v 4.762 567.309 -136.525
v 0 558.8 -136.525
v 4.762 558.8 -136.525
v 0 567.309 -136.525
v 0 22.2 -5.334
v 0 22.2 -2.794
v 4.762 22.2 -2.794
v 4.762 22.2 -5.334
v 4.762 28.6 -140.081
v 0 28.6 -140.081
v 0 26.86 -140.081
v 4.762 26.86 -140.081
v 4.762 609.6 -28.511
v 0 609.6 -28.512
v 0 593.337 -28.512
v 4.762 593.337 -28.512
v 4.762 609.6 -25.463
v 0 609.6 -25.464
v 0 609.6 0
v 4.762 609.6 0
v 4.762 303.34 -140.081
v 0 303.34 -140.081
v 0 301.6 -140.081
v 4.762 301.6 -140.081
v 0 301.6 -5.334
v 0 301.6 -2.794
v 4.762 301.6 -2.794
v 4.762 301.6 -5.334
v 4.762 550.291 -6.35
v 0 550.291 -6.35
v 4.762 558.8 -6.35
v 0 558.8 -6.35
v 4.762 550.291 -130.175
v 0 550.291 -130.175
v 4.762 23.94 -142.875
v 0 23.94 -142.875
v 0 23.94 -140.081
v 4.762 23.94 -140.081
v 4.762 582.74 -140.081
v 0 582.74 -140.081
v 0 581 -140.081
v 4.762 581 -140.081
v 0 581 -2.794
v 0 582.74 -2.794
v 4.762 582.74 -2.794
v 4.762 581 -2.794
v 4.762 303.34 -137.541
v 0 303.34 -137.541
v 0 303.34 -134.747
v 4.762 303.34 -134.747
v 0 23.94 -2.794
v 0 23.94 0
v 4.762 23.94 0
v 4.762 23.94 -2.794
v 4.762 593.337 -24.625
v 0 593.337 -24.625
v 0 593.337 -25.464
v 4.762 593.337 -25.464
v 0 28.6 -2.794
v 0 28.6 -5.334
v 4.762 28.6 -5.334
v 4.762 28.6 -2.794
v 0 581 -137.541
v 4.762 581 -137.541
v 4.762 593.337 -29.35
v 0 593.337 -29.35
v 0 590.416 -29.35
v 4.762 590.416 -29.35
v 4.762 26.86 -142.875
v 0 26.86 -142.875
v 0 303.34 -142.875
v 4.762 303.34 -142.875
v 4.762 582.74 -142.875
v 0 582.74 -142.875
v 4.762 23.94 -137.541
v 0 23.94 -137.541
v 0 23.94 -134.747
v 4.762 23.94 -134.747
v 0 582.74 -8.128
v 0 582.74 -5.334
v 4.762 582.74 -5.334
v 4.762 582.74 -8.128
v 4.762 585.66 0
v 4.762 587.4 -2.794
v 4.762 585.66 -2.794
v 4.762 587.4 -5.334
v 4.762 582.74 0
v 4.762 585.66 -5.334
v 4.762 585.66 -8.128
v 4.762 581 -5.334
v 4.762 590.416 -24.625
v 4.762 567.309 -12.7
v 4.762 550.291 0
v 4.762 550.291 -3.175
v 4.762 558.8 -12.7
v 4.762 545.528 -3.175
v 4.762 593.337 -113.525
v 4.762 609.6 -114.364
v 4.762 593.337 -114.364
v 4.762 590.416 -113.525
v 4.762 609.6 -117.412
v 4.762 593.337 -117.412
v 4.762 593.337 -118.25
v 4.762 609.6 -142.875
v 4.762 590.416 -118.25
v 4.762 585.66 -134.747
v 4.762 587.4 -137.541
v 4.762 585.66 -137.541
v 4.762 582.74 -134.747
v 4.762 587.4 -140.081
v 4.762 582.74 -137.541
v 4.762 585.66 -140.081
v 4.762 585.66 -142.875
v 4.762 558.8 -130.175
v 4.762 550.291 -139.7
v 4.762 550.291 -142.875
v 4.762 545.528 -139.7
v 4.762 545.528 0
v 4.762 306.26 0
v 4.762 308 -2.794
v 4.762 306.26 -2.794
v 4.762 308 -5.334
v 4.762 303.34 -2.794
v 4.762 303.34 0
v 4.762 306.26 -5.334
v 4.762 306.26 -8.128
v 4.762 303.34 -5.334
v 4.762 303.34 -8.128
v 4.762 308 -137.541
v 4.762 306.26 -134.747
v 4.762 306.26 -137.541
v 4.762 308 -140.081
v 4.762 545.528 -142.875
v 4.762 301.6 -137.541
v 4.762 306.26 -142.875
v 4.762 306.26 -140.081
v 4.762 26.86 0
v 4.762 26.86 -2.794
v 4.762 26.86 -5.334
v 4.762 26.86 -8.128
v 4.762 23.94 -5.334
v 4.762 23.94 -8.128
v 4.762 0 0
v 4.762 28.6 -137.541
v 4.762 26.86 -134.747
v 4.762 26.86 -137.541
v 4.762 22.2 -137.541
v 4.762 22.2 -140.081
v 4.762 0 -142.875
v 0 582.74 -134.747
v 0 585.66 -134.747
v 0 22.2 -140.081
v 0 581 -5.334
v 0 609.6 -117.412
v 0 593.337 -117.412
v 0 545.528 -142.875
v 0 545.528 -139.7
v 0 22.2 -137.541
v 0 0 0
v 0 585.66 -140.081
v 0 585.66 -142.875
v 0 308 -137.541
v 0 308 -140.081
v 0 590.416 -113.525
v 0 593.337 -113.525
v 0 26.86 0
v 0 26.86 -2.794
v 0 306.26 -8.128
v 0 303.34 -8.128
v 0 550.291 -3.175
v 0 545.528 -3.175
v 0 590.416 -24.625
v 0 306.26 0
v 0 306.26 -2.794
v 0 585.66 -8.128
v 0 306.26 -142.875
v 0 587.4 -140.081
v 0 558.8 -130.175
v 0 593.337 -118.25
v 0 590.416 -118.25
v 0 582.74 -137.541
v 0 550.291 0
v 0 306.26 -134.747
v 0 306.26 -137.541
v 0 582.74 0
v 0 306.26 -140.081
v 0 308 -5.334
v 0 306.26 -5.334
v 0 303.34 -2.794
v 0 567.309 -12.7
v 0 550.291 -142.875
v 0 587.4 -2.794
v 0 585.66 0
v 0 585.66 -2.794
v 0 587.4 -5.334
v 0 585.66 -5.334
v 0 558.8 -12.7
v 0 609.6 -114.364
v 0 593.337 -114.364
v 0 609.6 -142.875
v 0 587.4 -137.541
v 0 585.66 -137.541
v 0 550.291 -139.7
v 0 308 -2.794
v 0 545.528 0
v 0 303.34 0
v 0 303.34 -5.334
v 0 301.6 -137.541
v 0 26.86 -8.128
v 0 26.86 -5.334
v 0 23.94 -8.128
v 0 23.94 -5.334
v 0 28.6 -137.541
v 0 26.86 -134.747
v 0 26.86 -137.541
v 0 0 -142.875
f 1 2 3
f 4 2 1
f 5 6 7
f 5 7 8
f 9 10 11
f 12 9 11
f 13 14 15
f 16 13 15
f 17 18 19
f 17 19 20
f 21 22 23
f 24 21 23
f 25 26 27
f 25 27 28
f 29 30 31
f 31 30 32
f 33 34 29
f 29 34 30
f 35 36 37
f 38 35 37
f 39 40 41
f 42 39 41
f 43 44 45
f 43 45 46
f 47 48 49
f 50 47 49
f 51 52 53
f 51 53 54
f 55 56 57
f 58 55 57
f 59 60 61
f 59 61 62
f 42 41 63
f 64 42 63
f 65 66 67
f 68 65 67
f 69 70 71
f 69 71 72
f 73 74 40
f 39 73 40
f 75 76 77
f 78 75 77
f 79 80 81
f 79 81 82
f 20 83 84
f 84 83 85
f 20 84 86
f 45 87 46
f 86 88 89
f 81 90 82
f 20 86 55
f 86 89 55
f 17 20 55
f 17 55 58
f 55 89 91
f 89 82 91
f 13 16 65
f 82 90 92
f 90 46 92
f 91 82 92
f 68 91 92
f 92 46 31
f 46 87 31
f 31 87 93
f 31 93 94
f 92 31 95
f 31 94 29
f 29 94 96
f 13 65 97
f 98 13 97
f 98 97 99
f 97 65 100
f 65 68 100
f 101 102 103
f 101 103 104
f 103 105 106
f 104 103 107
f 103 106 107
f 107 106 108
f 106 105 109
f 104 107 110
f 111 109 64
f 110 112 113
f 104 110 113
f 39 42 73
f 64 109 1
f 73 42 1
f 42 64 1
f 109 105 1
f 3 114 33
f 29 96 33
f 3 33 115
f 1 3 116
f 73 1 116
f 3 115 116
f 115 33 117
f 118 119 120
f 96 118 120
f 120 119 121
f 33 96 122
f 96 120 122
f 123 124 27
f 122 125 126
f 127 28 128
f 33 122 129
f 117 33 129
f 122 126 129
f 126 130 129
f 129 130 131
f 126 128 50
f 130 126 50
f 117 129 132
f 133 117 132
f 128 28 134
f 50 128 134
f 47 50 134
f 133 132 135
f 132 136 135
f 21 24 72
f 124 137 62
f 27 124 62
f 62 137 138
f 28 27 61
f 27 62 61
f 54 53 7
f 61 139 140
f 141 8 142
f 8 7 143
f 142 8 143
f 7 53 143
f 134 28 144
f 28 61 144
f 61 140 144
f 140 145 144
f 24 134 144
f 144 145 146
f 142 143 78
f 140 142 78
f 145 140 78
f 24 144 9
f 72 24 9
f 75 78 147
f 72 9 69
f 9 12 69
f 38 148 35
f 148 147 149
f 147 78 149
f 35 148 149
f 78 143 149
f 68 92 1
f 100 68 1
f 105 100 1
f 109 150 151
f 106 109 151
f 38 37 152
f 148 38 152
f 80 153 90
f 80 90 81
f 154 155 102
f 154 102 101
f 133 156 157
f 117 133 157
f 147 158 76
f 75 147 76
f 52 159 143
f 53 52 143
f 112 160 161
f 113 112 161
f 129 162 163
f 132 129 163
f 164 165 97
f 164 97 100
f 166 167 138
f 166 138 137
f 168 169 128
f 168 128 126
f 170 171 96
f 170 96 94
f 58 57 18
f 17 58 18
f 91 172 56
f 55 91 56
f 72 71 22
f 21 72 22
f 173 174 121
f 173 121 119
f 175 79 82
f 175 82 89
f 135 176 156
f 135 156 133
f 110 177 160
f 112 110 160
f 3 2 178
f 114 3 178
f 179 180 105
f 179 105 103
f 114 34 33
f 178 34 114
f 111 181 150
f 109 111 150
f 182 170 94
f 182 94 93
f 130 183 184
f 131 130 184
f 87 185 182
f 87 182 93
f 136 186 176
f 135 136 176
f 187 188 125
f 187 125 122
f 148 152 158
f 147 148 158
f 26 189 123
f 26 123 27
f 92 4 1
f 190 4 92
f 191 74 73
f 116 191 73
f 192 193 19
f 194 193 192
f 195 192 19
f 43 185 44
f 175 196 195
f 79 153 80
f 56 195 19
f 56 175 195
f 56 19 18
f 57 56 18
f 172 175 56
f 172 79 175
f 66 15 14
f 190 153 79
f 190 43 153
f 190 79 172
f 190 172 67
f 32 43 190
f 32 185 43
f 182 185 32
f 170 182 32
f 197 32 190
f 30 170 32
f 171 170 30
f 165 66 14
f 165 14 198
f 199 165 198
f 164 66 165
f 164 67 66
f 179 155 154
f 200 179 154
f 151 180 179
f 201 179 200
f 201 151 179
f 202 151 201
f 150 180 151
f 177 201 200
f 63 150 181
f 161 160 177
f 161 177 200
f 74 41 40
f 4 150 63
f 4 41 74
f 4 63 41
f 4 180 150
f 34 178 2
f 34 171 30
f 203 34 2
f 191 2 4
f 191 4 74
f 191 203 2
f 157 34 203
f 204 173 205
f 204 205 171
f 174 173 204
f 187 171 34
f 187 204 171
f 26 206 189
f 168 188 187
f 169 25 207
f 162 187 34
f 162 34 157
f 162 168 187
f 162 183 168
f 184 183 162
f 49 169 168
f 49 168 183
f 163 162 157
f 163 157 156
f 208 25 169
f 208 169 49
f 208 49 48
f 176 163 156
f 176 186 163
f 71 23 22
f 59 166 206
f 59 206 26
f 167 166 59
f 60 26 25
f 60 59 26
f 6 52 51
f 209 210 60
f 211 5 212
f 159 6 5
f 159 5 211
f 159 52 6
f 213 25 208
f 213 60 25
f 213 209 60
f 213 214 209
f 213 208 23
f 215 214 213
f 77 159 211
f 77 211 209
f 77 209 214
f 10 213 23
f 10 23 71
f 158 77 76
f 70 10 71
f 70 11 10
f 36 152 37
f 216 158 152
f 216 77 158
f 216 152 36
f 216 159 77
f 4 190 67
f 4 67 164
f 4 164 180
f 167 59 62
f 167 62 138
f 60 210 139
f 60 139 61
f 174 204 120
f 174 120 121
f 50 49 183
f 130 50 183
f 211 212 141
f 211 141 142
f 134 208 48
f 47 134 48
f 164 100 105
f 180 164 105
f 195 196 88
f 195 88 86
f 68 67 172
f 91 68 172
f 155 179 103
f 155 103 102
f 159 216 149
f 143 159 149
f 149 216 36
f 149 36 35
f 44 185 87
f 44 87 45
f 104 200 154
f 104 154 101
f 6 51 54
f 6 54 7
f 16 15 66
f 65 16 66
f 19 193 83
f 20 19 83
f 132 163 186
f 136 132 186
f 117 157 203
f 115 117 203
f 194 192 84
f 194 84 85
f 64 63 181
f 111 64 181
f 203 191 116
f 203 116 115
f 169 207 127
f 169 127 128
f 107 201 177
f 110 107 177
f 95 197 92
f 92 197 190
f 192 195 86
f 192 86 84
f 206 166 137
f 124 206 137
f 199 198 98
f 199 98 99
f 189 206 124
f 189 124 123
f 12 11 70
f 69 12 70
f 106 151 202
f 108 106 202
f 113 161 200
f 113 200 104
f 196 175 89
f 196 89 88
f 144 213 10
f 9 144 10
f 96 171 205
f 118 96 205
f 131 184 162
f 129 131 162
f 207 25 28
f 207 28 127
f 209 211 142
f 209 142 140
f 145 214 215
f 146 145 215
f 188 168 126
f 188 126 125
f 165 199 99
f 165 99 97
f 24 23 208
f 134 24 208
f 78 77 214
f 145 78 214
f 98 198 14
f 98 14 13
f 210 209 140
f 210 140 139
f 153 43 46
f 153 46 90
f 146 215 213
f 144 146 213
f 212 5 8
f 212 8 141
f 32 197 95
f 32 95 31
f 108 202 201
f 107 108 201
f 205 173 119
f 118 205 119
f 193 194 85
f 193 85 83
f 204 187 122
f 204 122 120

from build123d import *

# Parameters (mm, degrees)
SKETCH1_W           = 4.7625
SKETCH1_H           = 142.875
BOSS_EXTRUDE1_DEPTH = 609.6
SKETCH12_W          = 123.825
SKETCH12_H          = 8.509
CUT_EXTRUDE7_DEPTH  = 627.13745059
SKETCH13_W          = 123.825
SKETCH13_H          = 8.509
CUT_EXTRUDE8_DEPTH  = 627.13745059
SKETCH15_W          = 3.175
SKETCH15_H          = 4.7625
CUT_EXTRUDE10_DEPTH = 627.13745059
CUT_EXTRUDE11_DEPTH = 627.13745059
CUT_EXTRUDE12_DEPTH = 627.13745059


with BuildPart() as part:
    # Sketch1 → Boss-Extrude1 (new body)
    with BuildSketch(Plane(origin=(0, 0, 0), x_dir=(1, 0, 0), z_dir=(0, 1, 0))):
        with Locations((2.38125, 71.4375)):
            Rectangle(SKETCH1_W, SKETCH1_H)
    extrude(amount=BOSS_EXTRUDE1_DEPTH)

    # Sketch12 → Cut-Extrude7 (cut, through all)
    with BuildSketch(Plane.ZY):
        with Locations((-68.2625, 554.5455)):
            Rectangle(SKETCH12_W, SKETCH12_H)
    extrude(amount=-CUT_EXTRUDE7_DEPTH, mode=Mode.SUBTRACT)

    # Sketch13 → Cut-Extrude8 (cut, through all)
    with BuildSketch(Plane.ZY):
        with Locations((-74.6125, 563.0545)):
            Rectangle(SKETCH13_W, SKETCH13_H)
    extrude(amount=-CUT_EXTRUDE8_DEPTH, mode=Mode.SUBTRACT)

    # Sketch15 → Cut-Extrude10 (cut, through all)
    with BuildSketch(Plane.ZY):
        with Locations((-1.5875, 547.90975)):
            Rectangle(SKETCH15_W, SKETCH15_H)
        with Locations((-141.2875, 547.90975)):
            Rectangle(SKETCH15_W, SKETCH15_H)
    extrude(amount=-CUT_EXTRUDE10_DEPTH, mode=Mode.SUBTRACT)

    # Sketch16 → Cut-Extrude11 (cut, through all)
    with BuildSketch(Plane.ZY):
        Polygon((-2.794, 23.9395), (-2.794, 22.1996), (-5.334, 22.1996), (-5.334, 23.9395), (-8.128, 23.9395), (-8.128, 26.8605), (-5.334, 26.8605), (-5.334, 28.6004), (-2.794, 28.6004), (-2.794, 26.8605), (0, 26.8605), (0, 23.9395), align=None)
        Polygon((-134.747, 26.8605), (-137.541, 26.8605), (-137.541, 28.6004), (-140.081, 28.6004), (-140.081, 26.8605), (-142.875, 26.8605), (-142.875, 23.9395), (-140.081, 23.9395), (-140.081, 22.1996), (-137.541, 22.1996), (-137.541, 23.9395), (-134.747, 23.9395), align=None)
        Polygon((-134.747, 306.2605), (-137.541, 306.2605), (-137.541, 308.0004), (-140.081, 308.0004), (-140.081, 306.2605), (-142.875, 306.2605), (-142.875, 303.3395), (-140.081, 303.3395), (-140.081, 301.5996), (-137.541, 301.5996), (-137.541, 303.3395), (-134.747, 303.3395), align=None)
        Polygon((-2.794, 303.3395), (-2.794, 301.5996), (-5.334, 301.5996), (-5.334, 303.3395), (-8.128, 303.3395), (-8.128, 306.2605), (-5.334, 306.2605), (-5.334, 308.0004), (-2.794, 308.0004), (-2.794, 306.2605), (0, 306.2605), (0, 303.3395), align=None)
        Polygon((-134.747, 585.6605), (-137.541, 585.6605), (-137.541, 587.4004), (-140.081, 587.4004), (-140.081, 585.6605), (-142.875, 585.6605), (-142.875, 582.7395), (-140.081, 582.7395), (-140.081, 580.9996), (-137.541, 580.9996), (-137.541, 582.7395), (-134.747, 582.7395), align=None)
        Polygon((-2.794, 582.7395), (-2.794, 580.9996), (-5.334, 580.9996), (-5.334, 582.7395), (-8.128, 582.7395), (-8.128, 585.6605), (-5.334, 585.6605), (-5.334, 587.4004), (-2.794, 587.4004), (-2.794, 585.6605), (0, 585.6605), (0, 582.7395), align=None)
    extrude(amount=-CUT_EXTRUDE11_DEPTH, mode=Mode.SUBTRACT)

    # Sketch17 → Cut-Extrude12 (cut, through all)
    with BuildSketch(Plane.ZY):
        Polygon((-28.5115, 593.337388892), (-29.3497, 593.337388892), (-29.3497, 590.416388892), (-24.6253, 590.416388892), (-24.6253, 593.337388892), (-25.4635, 593.337388892), (-25.4635, 609.6), (-28.5115, 609.6), align=None)
        Polygon((-117.4115, 609.6), (-114.3635, 609.6), (-114.3635, 593.337388892), (-113.5253, 593.337388892), (-113.5253, 590.416388892), (-118.2497, 590.416388892), (-118.2497, 593.337388892), (-117.4115, 593.337388892), align=None)
    extrude(amount=-CUT_EXTRUDE12_DEPTH, mode=Mode.SUBTRACT)


solid = part.part
